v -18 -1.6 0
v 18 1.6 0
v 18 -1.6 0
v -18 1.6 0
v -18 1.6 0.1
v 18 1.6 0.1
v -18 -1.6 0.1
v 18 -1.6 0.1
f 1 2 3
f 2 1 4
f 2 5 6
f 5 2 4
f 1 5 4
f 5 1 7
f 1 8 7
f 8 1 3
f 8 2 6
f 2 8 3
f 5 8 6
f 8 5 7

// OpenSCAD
// file: ../p/box5-12.scad
use <../lib.scad>
function ldraw_lib__box5_12() = [
// 0 Box with 5 Faces without Any Edges
// 0 Name: box5-12.dat
// 0 Author: Chris Dee [cwdee]
// 0 !LDRAW_ORG Primitive UPDATE 2009-02
// 0 !LICENSE Licensed under CC BY 4.0 : see CAreadme.txt
// 
// 0 BFC CERTIFY CCW
  [0,"BFC","CERTIFY"],
  [0,"BFC","CCW"],
// 
// 0 !HISTORY 2009-09-03 [PTadmin] Official Update 2009-02
// 
// 
// 4 16 1 1 1 1 1 -1 -1 1 -1 -1 1 1
  [4,16,1,1,1,1,1,-1,-1,1,-1,-1,1,1],
// 4 16 -1 0 1 1 0 1 1 1 1 -1 1 1
  [4,16,-1,0,1,1,0,1,1,1,1,-1,1,1],
// 4 16 -1 0 -1 -1 0 1 -1 1 1 -1 1 -1
  [4,16,-1,0,-1,-1,0,1,-1,1,1,-1,1,-1],
// 4 16 1 0 -1 -1 0 -1 -1 1 -1 1 1 -1
  [4,16,1,0,-1,-1,0,-1,-1,1,-1,1,1,-1],
// 4 16 1 0 1 1 0 -1 1 1 -1 1 1 1
  [4,16,1,0,1,1,0,-1,1,1,-1,1,1,1],
// 0
];
module ldraw_lib__box5_12(step=0, col=false, unit=2/5, alt=false, line=0.2, solid=!$preview)
    makepoly(ldraw_lib__box5_12(), step=step, col=col, unit=unit, alt=alt, line=line, solid=solid);
ldraw_lib__box5_12(line=0.2);
// main file
use <../lib.scad>
use <../p/box5-12.scad>
function ldraw_lib__6296256i() = [
// 0 Sticker  0.4 x  4.5 with A-pillar in Bright Light Yellow
// 0 Name: 6296256i.dat
// 0 Author: Magnus Forsberg [MagFors]
// 0 !LDRAW_ORG Part UPDATE 2020-03
// 0 !LICENSE Licensed under CC BY 4.0 : see CAreadme.txt
// 
// 0 BFC CERTIFY CCW
  [0,"BFC","CERTIFY"],
  [0,"BFC","CCW"],
// 
// 0 !KEYWORDS 500, Cinquecento, FIAT, Nuova, set 10271
// 
// 0 !HISTORY 2020-12-29 [PTadmin] Official Update 2020-03
// 
// 
// 1 16 0 -.25 0 45 0 0 0 .25 0 0 0 4 box5-12.dat
  [1,16,0,-.25,0,45,0,0,0,.25,0,0,0,4, ldraw_lib__box5_12()],
// 4 226 45 -.25 4 -45 -.25 4 -45 -.25 -4 45 -.25 -4
  [4,226,45,-.25,4,-45,-.25,4,-45,-.25,-4,45,-.25,-4],
];
module ldraw_lib__6296256i(step=0, col=false, unit=2/5, alt=false, line=0.2, solid=!$preview)
    makepoly(ldraw_lib__6296256i(), step=step, col=col, unit=unit, alt=alt, line=line, solid=solid);
ldraw_lib__6296256i(line=0.2);
